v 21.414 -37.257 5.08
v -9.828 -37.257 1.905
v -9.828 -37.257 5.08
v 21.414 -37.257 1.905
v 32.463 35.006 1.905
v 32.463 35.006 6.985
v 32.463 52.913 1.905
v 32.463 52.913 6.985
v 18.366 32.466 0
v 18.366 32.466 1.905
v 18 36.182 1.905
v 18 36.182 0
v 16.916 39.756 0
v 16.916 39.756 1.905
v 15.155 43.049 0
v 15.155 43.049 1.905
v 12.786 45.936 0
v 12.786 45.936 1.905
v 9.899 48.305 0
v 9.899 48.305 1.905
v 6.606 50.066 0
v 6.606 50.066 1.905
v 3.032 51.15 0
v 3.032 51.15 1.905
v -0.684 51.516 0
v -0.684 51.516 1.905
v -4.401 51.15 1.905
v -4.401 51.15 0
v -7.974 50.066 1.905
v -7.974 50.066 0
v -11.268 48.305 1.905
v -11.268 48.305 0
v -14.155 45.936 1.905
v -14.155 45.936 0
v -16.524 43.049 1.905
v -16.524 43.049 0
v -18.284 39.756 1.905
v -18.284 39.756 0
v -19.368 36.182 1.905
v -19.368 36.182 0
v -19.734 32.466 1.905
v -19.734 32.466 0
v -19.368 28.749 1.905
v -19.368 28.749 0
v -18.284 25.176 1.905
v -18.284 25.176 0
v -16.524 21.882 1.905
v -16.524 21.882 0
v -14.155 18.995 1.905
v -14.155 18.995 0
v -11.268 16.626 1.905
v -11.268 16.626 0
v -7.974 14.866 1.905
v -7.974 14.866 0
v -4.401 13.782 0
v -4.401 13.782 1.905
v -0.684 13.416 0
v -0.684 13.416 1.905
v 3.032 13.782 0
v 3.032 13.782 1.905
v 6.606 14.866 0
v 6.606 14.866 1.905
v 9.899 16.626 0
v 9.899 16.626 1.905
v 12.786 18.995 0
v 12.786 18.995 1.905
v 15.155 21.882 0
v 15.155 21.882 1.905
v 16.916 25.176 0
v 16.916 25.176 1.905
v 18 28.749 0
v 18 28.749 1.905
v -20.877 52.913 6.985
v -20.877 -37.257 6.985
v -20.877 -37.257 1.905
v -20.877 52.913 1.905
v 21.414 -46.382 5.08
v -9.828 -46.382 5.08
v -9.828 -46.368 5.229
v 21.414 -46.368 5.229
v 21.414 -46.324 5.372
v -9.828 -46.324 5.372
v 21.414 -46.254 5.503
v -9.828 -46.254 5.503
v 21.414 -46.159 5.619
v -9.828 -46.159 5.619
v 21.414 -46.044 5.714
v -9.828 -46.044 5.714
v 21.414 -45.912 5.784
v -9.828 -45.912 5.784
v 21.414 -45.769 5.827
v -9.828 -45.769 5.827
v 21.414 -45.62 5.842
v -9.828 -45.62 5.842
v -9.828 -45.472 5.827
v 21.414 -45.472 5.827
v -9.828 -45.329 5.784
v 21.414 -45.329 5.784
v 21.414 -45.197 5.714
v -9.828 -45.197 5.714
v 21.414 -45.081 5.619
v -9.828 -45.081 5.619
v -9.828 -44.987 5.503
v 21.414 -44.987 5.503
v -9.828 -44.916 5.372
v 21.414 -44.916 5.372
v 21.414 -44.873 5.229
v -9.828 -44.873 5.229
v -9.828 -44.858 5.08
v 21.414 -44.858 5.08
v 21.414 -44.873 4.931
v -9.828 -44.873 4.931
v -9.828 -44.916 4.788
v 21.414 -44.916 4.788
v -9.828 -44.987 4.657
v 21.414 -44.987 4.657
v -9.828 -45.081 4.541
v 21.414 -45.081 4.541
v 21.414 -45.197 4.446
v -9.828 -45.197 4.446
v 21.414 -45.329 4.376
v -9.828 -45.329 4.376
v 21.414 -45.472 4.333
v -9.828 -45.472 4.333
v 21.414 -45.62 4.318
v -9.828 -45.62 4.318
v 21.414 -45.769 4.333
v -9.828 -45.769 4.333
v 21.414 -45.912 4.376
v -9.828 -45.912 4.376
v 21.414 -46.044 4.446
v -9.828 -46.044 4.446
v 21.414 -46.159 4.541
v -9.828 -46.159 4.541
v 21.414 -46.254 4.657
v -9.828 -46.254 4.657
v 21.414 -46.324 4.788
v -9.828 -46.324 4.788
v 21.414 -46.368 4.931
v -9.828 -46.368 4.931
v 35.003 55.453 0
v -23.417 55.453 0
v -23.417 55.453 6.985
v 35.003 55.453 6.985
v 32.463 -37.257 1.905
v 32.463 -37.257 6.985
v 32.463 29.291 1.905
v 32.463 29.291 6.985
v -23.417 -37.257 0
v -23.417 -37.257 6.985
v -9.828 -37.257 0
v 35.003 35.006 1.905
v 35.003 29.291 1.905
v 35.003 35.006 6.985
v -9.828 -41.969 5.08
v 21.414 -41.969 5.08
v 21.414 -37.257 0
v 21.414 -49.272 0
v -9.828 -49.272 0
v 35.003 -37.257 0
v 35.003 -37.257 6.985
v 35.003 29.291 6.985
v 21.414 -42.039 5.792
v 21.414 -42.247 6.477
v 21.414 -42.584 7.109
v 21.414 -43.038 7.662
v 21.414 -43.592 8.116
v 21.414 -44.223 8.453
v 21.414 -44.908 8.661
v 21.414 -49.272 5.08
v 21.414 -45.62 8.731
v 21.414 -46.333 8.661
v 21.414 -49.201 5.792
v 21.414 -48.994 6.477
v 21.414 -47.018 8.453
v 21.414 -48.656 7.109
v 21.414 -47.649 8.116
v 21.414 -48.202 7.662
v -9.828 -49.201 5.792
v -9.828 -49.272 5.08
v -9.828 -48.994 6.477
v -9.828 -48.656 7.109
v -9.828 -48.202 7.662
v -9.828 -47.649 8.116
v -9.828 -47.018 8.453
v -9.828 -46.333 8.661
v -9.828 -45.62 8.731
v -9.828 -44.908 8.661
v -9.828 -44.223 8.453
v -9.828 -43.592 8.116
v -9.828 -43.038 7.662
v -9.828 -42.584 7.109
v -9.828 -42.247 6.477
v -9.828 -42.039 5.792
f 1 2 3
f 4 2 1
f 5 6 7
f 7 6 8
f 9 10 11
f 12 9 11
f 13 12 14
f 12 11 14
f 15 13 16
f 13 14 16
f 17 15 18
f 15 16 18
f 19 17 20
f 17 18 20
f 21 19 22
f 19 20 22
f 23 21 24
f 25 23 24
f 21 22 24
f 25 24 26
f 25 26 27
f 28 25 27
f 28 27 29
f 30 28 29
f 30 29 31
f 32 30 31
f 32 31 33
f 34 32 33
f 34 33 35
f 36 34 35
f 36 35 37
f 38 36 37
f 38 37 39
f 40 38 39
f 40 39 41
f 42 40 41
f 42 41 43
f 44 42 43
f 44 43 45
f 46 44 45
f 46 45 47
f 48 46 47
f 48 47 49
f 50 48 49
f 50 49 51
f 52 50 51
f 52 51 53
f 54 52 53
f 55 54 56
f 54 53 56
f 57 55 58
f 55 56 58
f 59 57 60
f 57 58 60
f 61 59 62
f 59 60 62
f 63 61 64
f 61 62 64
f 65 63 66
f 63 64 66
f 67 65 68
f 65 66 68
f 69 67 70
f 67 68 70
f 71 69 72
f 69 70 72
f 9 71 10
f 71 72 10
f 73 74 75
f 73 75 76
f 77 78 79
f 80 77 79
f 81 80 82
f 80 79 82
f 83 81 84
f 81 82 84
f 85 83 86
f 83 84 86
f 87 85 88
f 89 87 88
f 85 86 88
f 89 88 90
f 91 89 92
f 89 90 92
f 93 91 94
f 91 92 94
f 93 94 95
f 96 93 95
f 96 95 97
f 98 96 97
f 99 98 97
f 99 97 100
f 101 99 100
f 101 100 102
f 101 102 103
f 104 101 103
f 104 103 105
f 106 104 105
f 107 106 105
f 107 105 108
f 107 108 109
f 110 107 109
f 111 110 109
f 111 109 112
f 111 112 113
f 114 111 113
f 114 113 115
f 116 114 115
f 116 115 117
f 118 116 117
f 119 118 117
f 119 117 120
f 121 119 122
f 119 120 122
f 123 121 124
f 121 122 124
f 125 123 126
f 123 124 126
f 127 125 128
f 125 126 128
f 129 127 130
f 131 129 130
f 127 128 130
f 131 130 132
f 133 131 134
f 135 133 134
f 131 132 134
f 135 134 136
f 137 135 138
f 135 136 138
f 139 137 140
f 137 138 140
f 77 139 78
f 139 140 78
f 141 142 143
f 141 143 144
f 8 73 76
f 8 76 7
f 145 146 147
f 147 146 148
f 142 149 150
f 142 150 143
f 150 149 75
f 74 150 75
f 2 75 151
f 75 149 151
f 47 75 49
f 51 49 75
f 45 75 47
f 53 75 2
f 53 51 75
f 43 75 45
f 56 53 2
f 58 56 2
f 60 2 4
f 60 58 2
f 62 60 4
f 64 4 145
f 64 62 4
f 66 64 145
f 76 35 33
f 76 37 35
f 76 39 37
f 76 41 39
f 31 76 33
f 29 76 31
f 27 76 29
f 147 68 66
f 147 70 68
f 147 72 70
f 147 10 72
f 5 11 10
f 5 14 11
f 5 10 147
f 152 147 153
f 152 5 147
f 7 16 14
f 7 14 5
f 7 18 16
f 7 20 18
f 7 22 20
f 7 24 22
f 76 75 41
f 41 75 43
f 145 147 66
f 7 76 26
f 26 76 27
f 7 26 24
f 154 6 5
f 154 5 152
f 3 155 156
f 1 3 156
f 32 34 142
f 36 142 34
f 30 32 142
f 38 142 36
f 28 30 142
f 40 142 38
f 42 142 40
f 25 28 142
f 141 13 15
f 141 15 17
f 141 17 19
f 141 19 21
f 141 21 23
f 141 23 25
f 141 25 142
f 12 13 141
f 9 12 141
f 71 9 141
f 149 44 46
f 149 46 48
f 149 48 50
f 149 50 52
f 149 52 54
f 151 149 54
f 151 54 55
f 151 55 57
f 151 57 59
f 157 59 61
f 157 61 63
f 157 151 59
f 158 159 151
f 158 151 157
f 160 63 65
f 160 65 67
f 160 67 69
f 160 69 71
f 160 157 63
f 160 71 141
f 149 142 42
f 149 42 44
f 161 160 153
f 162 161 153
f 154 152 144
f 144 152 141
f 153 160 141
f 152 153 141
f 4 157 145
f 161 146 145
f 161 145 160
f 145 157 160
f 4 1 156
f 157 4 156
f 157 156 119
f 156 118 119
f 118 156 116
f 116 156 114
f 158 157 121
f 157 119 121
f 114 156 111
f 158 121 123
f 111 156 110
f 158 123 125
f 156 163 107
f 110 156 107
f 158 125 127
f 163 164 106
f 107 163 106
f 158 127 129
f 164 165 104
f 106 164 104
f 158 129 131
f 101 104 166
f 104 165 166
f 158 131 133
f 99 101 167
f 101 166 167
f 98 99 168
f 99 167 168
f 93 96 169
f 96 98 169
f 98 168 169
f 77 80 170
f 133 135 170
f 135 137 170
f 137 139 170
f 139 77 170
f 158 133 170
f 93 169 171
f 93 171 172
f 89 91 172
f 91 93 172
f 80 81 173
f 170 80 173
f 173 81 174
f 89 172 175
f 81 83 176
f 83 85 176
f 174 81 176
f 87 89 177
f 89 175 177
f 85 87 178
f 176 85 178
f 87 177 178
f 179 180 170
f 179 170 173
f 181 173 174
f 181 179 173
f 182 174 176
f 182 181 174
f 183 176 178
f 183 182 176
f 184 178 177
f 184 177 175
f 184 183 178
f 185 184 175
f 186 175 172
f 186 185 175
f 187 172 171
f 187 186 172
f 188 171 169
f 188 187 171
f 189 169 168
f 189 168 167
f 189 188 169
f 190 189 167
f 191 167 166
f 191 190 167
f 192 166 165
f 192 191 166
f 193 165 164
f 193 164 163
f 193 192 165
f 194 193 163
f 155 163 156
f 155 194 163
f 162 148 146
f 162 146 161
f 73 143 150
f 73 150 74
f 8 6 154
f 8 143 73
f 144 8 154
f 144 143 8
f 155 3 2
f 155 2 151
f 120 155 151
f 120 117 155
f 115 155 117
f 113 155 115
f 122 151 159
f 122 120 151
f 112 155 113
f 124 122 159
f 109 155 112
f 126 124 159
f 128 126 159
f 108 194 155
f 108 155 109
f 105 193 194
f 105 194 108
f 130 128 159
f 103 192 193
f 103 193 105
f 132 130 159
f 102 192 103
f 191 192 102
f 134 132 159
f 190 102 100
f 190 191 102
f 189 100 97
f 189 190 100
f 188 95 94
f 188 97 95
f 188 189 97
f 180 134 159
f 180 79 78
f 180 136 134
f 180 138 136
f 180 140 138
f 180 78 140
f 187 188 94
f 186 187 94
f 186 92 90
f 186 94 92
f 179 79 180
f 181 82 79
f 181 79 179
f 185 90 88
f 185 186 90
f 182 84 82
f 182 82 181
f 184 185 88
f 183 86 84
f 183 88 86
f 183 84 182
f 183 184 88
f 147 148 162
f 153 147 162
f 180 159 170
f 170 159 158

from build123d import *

# Parameters (mm, degrees)
F0_W      = 58.42
F0_H      = 92.71
F1_DEPTH  = 6.985
F2_W      = 53.34
F2_H      = 90.17
F3_DEPTH  = 5.08
F4_R      = 19.05
F5_DEPTH  = 25.4
F6_W      = 31.242
F6_H      = 12.0142
F7_DEPTH  = 5.08
F8_R      = 3.65125
F9_DEPTH  = 31.242
F10_R     = 0.762
F11_DEPTH = 38.1
F12_W     = 2.54
F12_H     = 5.715
F13_DEPTH = 5.08


with BuildPart() as f1:
    # F0 (on Top) → F1 (new body)
    with BuildSketch(Plane.XY):
        with Locations((5.7928592128, 9.0976799711)):
            Rectangle(F0_W, F0_H)
    extrude(amount=F1_DEPTH)

    # F2 (on face) → F3 (cut)
    with BuildSketch(Plane.XY.offset(6.985)):
        with Locations((5.7928592128, 7.8276799711)):
            Rectangle(F2_W, F2_H)
    extrude(amount=-F3_DEPTH, mode=Mode.SUBTRACT)

    # F4 (on face) → F5 (cut)
    with BuildSketch(Plane.XY.offset(1.905)):
        with Locations((-0.6841407872, 32.4656799711)):
            Circle(F4_R)
    extrude(amount=-F5_DEPTH, mode=Mode.SUBTRACT)

    # F6 (on face) → F7 (join)
    with BuildSketch(Plane(origin=(0, 0, 0), x_dir=(1, 0, 0), z_dir=(0, 0, -1))):
        with Locations((5.7928592128, 43.2644200289)):
            Rectangle(F6_W, F6_H)
    extrude(amount=-F7_DEPTH)

    # F8 (on face) → F9 (join)
    with BuildSketch(Plane(origin=(-9.8281407872, 0, 0), x_dir=(0, -1, 0), z_dir=(-1, 0, 0))):
        with Locations((45.6202700289, 5.08)):
            Circle(F8_R)
    extrude(amount=-F9_DEPTH)

    # F10 (on face) → F11 (cut)
    with BuildSketch(Plane(origin=(-9.8281407872, 0, 0), x_dir=(0, -1, 0), z_dir=(-1, 0, 0))):
        with Locations((45.6202700289, 5.08)):
            Circle(F10_R)
    extrude(amount=-F11_DEPTH, mode=Mode.SUBTRACT)

    # F12 (on face) → F13 (cut)
    with BuildSketch(Plane.XY.offset(6.985)):
        with Locations((33.7328592128, 32.1481799711)):
            Rectangle(F12_W, F12_H)
    extrude(amount=-F13_DEPTH, mode=Mode.SUBTRACT)


solid = f1.part
